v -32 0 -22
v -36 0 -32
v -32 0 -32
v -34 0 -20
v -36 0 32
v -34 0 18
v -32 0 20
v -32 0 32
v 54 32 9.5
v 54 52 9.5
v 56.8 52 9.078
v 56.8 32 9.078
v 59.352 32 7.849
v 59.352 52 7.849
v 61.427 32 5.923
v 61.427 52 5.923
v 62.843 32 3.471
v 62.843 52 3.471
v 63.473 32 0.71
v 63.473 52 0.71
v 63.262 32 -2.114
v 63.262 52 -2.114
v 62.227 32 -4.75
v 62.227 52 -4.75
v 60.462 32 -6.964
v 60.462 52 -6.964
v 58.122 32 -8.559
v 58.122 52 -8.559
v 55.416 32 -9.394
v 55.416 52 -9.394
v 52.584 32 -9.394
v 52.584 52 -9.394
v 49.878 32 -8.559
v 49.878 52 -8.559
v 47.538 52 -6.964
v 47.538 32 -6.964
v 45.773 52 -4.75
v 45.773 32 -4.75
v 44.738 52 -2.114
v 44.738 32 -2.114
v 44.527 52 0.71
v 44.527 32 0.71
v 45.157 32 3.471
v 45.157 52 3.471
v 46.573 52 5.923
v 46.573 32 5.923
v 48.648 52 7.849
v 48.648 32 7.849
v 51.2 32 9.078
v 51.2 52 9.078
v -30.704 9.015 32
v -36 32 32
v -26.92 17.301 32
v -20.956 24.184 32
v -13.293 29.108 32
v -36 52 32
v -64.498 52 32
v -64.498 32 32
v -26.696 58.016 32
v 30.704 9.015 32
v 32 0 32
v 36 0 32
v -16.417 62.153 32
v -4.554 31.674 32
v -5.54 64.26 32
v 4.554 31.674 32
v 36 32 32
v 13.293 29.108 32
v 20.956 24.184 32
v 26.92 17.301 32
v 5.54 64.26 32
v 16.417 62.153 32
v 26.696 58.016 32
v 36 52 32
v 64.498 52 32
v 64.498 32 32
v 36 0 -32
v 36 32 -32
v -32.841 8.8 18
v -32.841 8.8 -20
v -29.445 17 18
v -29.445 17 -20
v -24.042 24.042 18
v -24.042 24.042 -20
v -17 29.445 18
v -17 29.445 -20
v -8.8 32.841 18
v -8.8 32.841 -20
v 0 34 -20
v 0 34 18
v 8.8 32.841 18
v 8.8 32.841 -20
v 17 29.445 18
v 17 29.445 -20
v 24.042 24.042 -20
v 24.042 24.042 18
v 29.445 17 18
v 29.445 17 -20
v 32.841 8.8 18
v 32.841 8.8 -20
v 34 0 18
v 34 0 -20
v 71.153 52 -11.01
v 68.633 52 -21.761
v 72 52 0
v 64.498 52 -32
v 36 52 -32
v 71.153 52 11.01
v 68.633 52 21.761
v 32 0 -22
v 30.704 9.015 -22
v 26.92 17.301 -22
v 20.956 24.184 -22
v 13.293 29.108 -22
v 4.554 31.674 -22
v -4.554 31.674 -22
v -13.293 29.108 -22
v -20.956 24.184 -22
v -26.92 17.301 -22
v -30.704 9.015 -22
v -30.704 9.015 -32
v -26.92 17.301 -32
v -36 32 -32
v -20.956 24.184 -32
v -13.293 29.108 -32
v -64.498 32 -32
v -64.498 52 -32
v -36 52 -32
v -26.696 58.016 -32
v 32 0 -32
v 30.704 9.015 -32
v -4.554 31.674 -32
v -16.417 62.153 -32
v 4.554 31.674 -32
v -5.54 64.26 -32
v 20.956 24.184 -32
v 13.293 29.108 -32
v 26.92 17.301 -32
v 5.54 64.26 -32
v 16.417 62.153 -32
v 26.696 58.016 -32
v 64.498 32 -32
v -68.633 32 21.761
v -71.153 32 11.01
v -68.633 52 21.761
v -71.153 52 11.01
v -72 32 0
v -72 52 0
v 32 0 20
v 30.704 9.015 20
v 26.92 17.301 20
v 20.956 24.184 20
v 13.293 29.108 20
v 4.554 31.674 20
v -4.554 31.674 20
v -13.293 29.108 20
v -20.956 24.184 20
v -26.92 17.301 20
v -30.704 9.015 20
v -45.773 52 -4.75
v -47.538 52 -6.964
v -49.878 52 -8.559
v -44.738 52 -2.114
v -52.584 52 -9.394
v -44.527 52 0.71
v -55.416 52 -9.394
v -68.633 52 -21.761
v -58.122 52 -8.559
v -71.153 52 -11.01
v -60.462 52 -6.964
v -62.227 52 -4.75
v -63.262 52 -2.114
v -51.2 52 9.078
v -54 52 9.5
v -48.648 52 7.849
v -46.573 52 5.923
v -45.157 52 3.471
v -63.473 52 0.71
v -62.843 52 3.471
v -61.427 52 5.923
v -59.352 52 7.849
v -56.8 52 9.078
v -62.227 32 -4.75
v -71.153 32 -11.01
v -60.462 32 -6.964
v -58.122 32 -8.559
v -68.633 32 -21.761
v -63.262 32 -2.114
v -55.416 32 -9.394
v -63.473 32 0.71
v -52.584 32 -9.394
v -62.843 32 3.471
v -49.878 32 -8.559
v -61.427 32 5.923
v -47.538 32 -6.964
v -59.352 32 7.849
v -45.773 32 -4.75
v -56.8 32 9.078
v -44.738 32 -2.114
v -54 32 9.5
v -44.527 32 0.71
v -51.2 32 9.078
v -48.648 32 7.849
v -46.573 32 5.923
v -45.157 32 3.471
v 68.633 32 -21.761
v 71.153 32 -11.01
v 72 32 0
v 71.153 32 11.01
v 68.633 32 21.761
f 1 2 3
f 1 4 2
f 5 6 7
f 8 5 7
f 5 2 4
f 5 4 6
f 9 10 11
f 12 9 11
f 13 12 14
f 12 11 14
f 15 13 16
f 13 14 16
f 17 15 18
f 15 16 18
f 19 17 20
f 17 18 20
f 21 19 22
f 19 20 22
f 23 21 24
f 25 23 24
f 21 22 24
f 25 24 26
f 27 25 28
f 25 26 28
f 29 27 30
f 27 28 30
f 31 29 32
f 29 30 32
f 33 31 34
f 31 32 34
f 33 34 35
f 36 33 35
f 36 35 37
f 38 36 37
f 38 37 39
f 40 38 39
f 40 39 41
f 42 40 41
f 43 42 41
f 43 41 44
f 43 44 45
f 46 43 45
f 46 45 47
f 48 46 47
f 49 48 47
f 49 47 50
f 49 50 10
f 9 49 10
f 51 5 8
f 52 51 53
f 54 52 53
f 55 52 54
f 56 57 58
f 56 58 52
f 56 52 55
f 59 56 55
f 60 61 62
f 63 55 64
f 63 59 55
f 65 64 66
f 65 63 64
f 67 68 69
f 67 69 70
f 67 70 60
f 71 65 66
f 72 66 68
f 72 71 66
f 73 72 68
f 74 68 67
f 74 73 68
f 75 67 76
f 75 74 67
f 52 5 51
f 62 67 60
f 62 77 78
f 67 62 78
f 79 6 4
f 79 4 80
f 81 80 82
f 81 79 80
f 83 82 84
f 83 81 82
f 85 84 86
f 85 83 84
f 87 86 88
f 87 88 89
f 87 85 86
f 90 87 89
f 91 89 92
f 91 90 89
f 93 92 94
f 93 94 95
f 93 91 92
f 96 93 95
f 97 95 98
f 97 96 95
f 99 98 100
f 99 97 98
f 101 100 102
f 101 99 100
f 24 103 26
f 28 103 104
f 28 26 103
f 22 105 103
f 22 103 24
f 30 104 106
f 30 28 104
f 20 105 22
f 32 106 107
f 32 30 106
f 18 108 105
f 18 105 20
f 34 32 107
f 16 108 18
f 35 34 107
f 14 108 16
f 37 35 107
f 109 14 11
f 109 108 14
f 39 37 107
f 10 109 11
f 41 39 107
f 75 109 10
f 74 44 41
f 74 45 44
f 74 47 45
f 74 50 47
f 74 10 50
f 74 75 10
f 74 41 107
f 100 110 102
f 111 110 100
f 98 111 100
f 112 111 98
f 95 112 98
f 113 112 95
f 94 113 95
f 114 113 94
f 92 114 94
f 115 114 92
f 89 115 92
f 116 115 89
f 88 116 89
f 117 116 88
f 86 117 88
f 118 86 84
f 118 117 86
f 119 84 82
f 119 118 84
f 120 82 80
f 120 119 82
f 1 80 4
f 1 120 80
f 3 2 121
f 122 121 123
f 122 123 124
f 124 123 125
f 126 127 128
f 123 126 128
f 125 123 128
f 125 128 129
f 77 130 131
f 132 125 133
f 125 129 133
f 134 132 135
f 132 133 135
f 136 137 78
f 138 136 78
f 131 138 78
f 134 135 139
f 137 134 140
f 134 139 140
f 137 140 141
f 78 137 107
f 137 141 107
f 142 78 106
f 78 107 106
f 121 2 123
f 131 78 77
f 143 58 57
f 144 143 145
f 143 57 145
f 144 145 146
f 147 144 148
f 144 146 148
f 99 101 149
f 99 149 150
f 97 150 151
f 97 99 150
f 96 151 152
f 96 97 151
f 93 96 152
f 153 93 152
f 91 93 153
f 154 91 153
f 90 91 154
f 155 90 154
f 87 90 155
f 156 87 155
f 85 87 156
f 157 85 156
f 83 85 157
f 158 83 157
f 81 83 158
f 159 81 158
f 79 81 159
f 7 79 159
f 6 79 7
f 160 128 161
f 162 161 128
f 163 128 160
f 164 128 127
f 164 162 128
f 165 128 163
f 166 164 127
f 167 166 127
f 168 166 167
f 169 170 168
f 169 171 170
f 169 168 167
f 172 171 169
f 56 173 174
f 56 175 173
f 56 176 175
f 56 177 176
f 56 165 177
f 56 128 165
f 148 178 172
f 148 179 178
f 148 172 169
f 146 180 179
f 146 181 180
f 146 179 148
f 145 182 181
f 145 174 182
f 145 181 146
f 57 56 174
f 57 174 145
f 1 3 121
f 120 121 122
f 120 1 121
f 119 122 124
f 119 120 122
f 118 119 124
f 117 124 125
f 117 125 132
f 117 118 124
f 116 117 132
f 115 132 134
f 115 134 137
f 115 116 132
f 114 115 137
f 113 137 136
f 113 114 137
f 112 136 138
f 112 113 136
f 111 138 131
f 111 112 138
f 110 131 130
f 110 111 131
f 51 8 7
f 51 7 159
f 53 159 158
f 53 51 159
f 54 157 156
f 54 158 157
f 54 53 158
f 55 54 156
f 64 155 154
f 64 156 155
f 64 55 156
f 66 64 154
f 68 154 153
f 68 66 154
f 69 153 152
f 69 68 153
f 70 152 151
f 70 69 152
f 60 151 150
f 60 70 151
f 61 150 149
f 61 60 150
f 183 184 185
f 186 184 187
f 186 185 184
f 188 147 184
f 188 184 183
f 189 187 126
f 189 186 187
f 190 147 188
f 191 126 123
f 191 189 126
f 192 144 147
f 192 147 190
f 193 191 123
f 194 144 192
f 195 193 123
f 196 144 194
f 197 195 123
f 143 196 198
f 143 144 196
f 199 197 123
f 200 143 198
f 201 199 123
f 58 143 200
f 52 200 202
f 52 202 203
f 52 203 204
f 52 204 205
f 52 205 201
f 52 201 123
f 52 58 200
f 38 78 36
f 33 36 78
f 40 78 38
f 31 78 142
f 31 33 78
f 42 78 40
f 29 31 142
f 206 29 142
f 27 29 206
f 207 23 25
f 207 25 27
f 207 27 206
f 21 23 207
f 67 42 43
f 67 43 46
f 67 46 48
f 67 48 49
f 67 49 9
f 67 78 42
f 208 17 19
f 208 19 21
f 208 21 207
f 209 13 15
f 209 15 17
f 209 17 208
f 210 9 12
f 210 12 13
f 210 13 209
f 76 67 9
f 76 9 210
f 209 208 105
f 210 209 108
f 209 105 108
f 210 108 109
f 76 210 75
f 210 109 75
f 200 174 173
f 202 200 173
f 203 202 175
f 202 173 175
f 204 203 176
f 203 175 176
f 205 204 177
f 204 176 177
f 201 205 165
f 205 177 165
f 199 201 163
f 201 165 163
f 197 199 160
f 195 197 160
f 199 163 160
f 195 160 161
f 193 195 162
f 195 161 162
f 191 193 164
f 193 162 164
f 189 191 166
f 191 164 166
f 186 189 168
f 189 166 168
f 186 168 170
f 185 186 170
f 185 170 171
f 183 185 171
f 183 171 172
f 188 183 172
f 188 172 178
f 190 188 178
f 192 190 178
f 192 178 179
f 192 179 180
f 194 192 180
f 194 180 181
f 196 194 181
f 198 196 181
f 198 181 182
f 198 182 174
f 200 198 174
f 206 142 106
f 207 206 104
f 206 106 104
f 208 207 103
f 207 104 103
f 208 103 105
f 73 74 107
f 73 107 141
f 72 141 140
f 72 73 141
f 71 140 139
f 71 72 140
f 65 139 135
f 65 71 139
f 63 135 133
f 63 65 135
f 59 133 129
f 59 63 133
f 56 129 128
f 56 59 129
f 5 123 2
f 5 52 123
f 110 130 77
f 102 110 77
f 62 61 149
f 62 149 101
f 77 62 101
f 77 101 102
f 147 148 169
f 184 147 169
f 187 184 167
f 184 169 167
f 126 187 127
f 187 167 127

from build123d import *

# Parameters (mm, degrees)
BOSS_EXTRUDE1_DEPTH = 32
SKETCH2_R           = 9.5
CUT_EXTRUDE1_DEPTH  = 64
CUT_EXTRUDE2_DEPTH  = 22
CUT_EXTRUDE3_START  = -50
CUT_EXTRUDE3_DEPTH  = 38
CHAMFER1_SIZE       = 2


with BuildPart() as part:
    # Sketch1 → Boss-Extrude1 (new, symmetric)
    with BuildSketch(Plane.XY):
        with BuildLine():
            Line((-36, 0), (-32, 0))
            ThreePointArc((-32, 0), (0, 32), (32, 0))
            Line((32, 0), (36, 0))
            Line((36, 0), (36, 32))
            Line((36, 32), (72, 32))
            Line((72, 32), (72, 52))
            Line((72, 52), (36, 52))
            ThreePointArc((36, 52), (0, 64.524731996), (-36, 52))
            Line((-36, 52), (-72, 52))
            Line((-72, 52), (-72, 32))
            Line((-72, 32), (-36, 32))
            Line((-36, 32), (-36, 0))
        make_face()
    extrude(amount=BOSS_EXTRUDE1_DEPTH, both=True)

    # Sketch2 → Cut-Extrude1 (cut)
    with BuildSketch(Plane(origin=(0, 52, 0), x_dir=(1, 0, 0), z_dir=(0, 1, 0))):
        with Locations(Location((-54, 0, 0), (0, 0, 270))):
            Circle(SKETCH2_R)
        with Locations(Location((54, 0, 0), (0, 0, 270))):
            Circle(SKETCH2_R)
    extrude(amount=-CUT_EXTRUDE1_DEPTH, mode=Mode.SUBTRACT)

    # Sketch3 → Cut-Extrude2 (cut)
    with BuildSketch(Plane(origin=(0, 52, 0), x_dir=(1, 0, 0), z_dir=(0, 1, 0))):
        with BuildLine():
            ThreePointArc((-72, -4.4e-08), (-70.099431041, 16.433799554), (-64.498061986, 32))
            Line((-64.498061986, 32), (-72, 32))
            Line((-72, 32), (-72, -4.4e-08))
        make_face()
        with BuildLine():
            Line((-72, -32), (-64.498061986, -32))
            ThreePointArc((-64.498061986, -32), (-70.099431031, -16.433799597), (-72, -4.4e-08))
            Line((-72, -4.4e-08), (-72, -32))
        make_face()
        with BuildLine():
            Line((72, 32), (64.498061986, 32))
            ThreePointArc((64.498061986, 32), (70.099431036, 16.433799576), (72, 0))
            Line((72, 0), (72, 32))
        make_face()
        with BuildLine():
            ThreePointArc((72, 0), (70.099431036, -16.433799576), (64.498061986, -32))
            Line((64.498061986, -32), (72, -32))
            Line((72, -32), (72, 0))
        make_face()
    extrude(amount=-CUT_EXTRUDE2_DEPTH, mode=Mode.SUBTRACT)

    # Sketch5 → Cut-Extrude3 (cut)
    with BuildSketch(Plane(origin=(0, 0, -32), x_dir=(-1, 0, 0), z_dir=(0, 0, -1)).offset(CUT_EXTRUDE3_START)):
        with BuildLine():
            Line((-34, 0), (-32, 0))
            ThreePointArc((-32, 0), (0, 32), (32, 0))
            Line((32, 0), (34, 0))
            ThreePointArc((34, 0), (0, 34), (-34, 0))
        make_face()
    extrude(amount=CUT_EXTRUDE3_DEPTH, mode=Mode.SUBTRACT)

    # Chamfer1
    chamfer1_edges = [part.edges().sort_by_distance(p)[0] for p in [
        (0, 32, 18),
        (0, 32, -20),
    ]]
    chamfer(chamfer1_edges, length=CHAMFER1_SIZE - 0.0001)  # a hair under: the kernel refuses the full size


solid = part.part
